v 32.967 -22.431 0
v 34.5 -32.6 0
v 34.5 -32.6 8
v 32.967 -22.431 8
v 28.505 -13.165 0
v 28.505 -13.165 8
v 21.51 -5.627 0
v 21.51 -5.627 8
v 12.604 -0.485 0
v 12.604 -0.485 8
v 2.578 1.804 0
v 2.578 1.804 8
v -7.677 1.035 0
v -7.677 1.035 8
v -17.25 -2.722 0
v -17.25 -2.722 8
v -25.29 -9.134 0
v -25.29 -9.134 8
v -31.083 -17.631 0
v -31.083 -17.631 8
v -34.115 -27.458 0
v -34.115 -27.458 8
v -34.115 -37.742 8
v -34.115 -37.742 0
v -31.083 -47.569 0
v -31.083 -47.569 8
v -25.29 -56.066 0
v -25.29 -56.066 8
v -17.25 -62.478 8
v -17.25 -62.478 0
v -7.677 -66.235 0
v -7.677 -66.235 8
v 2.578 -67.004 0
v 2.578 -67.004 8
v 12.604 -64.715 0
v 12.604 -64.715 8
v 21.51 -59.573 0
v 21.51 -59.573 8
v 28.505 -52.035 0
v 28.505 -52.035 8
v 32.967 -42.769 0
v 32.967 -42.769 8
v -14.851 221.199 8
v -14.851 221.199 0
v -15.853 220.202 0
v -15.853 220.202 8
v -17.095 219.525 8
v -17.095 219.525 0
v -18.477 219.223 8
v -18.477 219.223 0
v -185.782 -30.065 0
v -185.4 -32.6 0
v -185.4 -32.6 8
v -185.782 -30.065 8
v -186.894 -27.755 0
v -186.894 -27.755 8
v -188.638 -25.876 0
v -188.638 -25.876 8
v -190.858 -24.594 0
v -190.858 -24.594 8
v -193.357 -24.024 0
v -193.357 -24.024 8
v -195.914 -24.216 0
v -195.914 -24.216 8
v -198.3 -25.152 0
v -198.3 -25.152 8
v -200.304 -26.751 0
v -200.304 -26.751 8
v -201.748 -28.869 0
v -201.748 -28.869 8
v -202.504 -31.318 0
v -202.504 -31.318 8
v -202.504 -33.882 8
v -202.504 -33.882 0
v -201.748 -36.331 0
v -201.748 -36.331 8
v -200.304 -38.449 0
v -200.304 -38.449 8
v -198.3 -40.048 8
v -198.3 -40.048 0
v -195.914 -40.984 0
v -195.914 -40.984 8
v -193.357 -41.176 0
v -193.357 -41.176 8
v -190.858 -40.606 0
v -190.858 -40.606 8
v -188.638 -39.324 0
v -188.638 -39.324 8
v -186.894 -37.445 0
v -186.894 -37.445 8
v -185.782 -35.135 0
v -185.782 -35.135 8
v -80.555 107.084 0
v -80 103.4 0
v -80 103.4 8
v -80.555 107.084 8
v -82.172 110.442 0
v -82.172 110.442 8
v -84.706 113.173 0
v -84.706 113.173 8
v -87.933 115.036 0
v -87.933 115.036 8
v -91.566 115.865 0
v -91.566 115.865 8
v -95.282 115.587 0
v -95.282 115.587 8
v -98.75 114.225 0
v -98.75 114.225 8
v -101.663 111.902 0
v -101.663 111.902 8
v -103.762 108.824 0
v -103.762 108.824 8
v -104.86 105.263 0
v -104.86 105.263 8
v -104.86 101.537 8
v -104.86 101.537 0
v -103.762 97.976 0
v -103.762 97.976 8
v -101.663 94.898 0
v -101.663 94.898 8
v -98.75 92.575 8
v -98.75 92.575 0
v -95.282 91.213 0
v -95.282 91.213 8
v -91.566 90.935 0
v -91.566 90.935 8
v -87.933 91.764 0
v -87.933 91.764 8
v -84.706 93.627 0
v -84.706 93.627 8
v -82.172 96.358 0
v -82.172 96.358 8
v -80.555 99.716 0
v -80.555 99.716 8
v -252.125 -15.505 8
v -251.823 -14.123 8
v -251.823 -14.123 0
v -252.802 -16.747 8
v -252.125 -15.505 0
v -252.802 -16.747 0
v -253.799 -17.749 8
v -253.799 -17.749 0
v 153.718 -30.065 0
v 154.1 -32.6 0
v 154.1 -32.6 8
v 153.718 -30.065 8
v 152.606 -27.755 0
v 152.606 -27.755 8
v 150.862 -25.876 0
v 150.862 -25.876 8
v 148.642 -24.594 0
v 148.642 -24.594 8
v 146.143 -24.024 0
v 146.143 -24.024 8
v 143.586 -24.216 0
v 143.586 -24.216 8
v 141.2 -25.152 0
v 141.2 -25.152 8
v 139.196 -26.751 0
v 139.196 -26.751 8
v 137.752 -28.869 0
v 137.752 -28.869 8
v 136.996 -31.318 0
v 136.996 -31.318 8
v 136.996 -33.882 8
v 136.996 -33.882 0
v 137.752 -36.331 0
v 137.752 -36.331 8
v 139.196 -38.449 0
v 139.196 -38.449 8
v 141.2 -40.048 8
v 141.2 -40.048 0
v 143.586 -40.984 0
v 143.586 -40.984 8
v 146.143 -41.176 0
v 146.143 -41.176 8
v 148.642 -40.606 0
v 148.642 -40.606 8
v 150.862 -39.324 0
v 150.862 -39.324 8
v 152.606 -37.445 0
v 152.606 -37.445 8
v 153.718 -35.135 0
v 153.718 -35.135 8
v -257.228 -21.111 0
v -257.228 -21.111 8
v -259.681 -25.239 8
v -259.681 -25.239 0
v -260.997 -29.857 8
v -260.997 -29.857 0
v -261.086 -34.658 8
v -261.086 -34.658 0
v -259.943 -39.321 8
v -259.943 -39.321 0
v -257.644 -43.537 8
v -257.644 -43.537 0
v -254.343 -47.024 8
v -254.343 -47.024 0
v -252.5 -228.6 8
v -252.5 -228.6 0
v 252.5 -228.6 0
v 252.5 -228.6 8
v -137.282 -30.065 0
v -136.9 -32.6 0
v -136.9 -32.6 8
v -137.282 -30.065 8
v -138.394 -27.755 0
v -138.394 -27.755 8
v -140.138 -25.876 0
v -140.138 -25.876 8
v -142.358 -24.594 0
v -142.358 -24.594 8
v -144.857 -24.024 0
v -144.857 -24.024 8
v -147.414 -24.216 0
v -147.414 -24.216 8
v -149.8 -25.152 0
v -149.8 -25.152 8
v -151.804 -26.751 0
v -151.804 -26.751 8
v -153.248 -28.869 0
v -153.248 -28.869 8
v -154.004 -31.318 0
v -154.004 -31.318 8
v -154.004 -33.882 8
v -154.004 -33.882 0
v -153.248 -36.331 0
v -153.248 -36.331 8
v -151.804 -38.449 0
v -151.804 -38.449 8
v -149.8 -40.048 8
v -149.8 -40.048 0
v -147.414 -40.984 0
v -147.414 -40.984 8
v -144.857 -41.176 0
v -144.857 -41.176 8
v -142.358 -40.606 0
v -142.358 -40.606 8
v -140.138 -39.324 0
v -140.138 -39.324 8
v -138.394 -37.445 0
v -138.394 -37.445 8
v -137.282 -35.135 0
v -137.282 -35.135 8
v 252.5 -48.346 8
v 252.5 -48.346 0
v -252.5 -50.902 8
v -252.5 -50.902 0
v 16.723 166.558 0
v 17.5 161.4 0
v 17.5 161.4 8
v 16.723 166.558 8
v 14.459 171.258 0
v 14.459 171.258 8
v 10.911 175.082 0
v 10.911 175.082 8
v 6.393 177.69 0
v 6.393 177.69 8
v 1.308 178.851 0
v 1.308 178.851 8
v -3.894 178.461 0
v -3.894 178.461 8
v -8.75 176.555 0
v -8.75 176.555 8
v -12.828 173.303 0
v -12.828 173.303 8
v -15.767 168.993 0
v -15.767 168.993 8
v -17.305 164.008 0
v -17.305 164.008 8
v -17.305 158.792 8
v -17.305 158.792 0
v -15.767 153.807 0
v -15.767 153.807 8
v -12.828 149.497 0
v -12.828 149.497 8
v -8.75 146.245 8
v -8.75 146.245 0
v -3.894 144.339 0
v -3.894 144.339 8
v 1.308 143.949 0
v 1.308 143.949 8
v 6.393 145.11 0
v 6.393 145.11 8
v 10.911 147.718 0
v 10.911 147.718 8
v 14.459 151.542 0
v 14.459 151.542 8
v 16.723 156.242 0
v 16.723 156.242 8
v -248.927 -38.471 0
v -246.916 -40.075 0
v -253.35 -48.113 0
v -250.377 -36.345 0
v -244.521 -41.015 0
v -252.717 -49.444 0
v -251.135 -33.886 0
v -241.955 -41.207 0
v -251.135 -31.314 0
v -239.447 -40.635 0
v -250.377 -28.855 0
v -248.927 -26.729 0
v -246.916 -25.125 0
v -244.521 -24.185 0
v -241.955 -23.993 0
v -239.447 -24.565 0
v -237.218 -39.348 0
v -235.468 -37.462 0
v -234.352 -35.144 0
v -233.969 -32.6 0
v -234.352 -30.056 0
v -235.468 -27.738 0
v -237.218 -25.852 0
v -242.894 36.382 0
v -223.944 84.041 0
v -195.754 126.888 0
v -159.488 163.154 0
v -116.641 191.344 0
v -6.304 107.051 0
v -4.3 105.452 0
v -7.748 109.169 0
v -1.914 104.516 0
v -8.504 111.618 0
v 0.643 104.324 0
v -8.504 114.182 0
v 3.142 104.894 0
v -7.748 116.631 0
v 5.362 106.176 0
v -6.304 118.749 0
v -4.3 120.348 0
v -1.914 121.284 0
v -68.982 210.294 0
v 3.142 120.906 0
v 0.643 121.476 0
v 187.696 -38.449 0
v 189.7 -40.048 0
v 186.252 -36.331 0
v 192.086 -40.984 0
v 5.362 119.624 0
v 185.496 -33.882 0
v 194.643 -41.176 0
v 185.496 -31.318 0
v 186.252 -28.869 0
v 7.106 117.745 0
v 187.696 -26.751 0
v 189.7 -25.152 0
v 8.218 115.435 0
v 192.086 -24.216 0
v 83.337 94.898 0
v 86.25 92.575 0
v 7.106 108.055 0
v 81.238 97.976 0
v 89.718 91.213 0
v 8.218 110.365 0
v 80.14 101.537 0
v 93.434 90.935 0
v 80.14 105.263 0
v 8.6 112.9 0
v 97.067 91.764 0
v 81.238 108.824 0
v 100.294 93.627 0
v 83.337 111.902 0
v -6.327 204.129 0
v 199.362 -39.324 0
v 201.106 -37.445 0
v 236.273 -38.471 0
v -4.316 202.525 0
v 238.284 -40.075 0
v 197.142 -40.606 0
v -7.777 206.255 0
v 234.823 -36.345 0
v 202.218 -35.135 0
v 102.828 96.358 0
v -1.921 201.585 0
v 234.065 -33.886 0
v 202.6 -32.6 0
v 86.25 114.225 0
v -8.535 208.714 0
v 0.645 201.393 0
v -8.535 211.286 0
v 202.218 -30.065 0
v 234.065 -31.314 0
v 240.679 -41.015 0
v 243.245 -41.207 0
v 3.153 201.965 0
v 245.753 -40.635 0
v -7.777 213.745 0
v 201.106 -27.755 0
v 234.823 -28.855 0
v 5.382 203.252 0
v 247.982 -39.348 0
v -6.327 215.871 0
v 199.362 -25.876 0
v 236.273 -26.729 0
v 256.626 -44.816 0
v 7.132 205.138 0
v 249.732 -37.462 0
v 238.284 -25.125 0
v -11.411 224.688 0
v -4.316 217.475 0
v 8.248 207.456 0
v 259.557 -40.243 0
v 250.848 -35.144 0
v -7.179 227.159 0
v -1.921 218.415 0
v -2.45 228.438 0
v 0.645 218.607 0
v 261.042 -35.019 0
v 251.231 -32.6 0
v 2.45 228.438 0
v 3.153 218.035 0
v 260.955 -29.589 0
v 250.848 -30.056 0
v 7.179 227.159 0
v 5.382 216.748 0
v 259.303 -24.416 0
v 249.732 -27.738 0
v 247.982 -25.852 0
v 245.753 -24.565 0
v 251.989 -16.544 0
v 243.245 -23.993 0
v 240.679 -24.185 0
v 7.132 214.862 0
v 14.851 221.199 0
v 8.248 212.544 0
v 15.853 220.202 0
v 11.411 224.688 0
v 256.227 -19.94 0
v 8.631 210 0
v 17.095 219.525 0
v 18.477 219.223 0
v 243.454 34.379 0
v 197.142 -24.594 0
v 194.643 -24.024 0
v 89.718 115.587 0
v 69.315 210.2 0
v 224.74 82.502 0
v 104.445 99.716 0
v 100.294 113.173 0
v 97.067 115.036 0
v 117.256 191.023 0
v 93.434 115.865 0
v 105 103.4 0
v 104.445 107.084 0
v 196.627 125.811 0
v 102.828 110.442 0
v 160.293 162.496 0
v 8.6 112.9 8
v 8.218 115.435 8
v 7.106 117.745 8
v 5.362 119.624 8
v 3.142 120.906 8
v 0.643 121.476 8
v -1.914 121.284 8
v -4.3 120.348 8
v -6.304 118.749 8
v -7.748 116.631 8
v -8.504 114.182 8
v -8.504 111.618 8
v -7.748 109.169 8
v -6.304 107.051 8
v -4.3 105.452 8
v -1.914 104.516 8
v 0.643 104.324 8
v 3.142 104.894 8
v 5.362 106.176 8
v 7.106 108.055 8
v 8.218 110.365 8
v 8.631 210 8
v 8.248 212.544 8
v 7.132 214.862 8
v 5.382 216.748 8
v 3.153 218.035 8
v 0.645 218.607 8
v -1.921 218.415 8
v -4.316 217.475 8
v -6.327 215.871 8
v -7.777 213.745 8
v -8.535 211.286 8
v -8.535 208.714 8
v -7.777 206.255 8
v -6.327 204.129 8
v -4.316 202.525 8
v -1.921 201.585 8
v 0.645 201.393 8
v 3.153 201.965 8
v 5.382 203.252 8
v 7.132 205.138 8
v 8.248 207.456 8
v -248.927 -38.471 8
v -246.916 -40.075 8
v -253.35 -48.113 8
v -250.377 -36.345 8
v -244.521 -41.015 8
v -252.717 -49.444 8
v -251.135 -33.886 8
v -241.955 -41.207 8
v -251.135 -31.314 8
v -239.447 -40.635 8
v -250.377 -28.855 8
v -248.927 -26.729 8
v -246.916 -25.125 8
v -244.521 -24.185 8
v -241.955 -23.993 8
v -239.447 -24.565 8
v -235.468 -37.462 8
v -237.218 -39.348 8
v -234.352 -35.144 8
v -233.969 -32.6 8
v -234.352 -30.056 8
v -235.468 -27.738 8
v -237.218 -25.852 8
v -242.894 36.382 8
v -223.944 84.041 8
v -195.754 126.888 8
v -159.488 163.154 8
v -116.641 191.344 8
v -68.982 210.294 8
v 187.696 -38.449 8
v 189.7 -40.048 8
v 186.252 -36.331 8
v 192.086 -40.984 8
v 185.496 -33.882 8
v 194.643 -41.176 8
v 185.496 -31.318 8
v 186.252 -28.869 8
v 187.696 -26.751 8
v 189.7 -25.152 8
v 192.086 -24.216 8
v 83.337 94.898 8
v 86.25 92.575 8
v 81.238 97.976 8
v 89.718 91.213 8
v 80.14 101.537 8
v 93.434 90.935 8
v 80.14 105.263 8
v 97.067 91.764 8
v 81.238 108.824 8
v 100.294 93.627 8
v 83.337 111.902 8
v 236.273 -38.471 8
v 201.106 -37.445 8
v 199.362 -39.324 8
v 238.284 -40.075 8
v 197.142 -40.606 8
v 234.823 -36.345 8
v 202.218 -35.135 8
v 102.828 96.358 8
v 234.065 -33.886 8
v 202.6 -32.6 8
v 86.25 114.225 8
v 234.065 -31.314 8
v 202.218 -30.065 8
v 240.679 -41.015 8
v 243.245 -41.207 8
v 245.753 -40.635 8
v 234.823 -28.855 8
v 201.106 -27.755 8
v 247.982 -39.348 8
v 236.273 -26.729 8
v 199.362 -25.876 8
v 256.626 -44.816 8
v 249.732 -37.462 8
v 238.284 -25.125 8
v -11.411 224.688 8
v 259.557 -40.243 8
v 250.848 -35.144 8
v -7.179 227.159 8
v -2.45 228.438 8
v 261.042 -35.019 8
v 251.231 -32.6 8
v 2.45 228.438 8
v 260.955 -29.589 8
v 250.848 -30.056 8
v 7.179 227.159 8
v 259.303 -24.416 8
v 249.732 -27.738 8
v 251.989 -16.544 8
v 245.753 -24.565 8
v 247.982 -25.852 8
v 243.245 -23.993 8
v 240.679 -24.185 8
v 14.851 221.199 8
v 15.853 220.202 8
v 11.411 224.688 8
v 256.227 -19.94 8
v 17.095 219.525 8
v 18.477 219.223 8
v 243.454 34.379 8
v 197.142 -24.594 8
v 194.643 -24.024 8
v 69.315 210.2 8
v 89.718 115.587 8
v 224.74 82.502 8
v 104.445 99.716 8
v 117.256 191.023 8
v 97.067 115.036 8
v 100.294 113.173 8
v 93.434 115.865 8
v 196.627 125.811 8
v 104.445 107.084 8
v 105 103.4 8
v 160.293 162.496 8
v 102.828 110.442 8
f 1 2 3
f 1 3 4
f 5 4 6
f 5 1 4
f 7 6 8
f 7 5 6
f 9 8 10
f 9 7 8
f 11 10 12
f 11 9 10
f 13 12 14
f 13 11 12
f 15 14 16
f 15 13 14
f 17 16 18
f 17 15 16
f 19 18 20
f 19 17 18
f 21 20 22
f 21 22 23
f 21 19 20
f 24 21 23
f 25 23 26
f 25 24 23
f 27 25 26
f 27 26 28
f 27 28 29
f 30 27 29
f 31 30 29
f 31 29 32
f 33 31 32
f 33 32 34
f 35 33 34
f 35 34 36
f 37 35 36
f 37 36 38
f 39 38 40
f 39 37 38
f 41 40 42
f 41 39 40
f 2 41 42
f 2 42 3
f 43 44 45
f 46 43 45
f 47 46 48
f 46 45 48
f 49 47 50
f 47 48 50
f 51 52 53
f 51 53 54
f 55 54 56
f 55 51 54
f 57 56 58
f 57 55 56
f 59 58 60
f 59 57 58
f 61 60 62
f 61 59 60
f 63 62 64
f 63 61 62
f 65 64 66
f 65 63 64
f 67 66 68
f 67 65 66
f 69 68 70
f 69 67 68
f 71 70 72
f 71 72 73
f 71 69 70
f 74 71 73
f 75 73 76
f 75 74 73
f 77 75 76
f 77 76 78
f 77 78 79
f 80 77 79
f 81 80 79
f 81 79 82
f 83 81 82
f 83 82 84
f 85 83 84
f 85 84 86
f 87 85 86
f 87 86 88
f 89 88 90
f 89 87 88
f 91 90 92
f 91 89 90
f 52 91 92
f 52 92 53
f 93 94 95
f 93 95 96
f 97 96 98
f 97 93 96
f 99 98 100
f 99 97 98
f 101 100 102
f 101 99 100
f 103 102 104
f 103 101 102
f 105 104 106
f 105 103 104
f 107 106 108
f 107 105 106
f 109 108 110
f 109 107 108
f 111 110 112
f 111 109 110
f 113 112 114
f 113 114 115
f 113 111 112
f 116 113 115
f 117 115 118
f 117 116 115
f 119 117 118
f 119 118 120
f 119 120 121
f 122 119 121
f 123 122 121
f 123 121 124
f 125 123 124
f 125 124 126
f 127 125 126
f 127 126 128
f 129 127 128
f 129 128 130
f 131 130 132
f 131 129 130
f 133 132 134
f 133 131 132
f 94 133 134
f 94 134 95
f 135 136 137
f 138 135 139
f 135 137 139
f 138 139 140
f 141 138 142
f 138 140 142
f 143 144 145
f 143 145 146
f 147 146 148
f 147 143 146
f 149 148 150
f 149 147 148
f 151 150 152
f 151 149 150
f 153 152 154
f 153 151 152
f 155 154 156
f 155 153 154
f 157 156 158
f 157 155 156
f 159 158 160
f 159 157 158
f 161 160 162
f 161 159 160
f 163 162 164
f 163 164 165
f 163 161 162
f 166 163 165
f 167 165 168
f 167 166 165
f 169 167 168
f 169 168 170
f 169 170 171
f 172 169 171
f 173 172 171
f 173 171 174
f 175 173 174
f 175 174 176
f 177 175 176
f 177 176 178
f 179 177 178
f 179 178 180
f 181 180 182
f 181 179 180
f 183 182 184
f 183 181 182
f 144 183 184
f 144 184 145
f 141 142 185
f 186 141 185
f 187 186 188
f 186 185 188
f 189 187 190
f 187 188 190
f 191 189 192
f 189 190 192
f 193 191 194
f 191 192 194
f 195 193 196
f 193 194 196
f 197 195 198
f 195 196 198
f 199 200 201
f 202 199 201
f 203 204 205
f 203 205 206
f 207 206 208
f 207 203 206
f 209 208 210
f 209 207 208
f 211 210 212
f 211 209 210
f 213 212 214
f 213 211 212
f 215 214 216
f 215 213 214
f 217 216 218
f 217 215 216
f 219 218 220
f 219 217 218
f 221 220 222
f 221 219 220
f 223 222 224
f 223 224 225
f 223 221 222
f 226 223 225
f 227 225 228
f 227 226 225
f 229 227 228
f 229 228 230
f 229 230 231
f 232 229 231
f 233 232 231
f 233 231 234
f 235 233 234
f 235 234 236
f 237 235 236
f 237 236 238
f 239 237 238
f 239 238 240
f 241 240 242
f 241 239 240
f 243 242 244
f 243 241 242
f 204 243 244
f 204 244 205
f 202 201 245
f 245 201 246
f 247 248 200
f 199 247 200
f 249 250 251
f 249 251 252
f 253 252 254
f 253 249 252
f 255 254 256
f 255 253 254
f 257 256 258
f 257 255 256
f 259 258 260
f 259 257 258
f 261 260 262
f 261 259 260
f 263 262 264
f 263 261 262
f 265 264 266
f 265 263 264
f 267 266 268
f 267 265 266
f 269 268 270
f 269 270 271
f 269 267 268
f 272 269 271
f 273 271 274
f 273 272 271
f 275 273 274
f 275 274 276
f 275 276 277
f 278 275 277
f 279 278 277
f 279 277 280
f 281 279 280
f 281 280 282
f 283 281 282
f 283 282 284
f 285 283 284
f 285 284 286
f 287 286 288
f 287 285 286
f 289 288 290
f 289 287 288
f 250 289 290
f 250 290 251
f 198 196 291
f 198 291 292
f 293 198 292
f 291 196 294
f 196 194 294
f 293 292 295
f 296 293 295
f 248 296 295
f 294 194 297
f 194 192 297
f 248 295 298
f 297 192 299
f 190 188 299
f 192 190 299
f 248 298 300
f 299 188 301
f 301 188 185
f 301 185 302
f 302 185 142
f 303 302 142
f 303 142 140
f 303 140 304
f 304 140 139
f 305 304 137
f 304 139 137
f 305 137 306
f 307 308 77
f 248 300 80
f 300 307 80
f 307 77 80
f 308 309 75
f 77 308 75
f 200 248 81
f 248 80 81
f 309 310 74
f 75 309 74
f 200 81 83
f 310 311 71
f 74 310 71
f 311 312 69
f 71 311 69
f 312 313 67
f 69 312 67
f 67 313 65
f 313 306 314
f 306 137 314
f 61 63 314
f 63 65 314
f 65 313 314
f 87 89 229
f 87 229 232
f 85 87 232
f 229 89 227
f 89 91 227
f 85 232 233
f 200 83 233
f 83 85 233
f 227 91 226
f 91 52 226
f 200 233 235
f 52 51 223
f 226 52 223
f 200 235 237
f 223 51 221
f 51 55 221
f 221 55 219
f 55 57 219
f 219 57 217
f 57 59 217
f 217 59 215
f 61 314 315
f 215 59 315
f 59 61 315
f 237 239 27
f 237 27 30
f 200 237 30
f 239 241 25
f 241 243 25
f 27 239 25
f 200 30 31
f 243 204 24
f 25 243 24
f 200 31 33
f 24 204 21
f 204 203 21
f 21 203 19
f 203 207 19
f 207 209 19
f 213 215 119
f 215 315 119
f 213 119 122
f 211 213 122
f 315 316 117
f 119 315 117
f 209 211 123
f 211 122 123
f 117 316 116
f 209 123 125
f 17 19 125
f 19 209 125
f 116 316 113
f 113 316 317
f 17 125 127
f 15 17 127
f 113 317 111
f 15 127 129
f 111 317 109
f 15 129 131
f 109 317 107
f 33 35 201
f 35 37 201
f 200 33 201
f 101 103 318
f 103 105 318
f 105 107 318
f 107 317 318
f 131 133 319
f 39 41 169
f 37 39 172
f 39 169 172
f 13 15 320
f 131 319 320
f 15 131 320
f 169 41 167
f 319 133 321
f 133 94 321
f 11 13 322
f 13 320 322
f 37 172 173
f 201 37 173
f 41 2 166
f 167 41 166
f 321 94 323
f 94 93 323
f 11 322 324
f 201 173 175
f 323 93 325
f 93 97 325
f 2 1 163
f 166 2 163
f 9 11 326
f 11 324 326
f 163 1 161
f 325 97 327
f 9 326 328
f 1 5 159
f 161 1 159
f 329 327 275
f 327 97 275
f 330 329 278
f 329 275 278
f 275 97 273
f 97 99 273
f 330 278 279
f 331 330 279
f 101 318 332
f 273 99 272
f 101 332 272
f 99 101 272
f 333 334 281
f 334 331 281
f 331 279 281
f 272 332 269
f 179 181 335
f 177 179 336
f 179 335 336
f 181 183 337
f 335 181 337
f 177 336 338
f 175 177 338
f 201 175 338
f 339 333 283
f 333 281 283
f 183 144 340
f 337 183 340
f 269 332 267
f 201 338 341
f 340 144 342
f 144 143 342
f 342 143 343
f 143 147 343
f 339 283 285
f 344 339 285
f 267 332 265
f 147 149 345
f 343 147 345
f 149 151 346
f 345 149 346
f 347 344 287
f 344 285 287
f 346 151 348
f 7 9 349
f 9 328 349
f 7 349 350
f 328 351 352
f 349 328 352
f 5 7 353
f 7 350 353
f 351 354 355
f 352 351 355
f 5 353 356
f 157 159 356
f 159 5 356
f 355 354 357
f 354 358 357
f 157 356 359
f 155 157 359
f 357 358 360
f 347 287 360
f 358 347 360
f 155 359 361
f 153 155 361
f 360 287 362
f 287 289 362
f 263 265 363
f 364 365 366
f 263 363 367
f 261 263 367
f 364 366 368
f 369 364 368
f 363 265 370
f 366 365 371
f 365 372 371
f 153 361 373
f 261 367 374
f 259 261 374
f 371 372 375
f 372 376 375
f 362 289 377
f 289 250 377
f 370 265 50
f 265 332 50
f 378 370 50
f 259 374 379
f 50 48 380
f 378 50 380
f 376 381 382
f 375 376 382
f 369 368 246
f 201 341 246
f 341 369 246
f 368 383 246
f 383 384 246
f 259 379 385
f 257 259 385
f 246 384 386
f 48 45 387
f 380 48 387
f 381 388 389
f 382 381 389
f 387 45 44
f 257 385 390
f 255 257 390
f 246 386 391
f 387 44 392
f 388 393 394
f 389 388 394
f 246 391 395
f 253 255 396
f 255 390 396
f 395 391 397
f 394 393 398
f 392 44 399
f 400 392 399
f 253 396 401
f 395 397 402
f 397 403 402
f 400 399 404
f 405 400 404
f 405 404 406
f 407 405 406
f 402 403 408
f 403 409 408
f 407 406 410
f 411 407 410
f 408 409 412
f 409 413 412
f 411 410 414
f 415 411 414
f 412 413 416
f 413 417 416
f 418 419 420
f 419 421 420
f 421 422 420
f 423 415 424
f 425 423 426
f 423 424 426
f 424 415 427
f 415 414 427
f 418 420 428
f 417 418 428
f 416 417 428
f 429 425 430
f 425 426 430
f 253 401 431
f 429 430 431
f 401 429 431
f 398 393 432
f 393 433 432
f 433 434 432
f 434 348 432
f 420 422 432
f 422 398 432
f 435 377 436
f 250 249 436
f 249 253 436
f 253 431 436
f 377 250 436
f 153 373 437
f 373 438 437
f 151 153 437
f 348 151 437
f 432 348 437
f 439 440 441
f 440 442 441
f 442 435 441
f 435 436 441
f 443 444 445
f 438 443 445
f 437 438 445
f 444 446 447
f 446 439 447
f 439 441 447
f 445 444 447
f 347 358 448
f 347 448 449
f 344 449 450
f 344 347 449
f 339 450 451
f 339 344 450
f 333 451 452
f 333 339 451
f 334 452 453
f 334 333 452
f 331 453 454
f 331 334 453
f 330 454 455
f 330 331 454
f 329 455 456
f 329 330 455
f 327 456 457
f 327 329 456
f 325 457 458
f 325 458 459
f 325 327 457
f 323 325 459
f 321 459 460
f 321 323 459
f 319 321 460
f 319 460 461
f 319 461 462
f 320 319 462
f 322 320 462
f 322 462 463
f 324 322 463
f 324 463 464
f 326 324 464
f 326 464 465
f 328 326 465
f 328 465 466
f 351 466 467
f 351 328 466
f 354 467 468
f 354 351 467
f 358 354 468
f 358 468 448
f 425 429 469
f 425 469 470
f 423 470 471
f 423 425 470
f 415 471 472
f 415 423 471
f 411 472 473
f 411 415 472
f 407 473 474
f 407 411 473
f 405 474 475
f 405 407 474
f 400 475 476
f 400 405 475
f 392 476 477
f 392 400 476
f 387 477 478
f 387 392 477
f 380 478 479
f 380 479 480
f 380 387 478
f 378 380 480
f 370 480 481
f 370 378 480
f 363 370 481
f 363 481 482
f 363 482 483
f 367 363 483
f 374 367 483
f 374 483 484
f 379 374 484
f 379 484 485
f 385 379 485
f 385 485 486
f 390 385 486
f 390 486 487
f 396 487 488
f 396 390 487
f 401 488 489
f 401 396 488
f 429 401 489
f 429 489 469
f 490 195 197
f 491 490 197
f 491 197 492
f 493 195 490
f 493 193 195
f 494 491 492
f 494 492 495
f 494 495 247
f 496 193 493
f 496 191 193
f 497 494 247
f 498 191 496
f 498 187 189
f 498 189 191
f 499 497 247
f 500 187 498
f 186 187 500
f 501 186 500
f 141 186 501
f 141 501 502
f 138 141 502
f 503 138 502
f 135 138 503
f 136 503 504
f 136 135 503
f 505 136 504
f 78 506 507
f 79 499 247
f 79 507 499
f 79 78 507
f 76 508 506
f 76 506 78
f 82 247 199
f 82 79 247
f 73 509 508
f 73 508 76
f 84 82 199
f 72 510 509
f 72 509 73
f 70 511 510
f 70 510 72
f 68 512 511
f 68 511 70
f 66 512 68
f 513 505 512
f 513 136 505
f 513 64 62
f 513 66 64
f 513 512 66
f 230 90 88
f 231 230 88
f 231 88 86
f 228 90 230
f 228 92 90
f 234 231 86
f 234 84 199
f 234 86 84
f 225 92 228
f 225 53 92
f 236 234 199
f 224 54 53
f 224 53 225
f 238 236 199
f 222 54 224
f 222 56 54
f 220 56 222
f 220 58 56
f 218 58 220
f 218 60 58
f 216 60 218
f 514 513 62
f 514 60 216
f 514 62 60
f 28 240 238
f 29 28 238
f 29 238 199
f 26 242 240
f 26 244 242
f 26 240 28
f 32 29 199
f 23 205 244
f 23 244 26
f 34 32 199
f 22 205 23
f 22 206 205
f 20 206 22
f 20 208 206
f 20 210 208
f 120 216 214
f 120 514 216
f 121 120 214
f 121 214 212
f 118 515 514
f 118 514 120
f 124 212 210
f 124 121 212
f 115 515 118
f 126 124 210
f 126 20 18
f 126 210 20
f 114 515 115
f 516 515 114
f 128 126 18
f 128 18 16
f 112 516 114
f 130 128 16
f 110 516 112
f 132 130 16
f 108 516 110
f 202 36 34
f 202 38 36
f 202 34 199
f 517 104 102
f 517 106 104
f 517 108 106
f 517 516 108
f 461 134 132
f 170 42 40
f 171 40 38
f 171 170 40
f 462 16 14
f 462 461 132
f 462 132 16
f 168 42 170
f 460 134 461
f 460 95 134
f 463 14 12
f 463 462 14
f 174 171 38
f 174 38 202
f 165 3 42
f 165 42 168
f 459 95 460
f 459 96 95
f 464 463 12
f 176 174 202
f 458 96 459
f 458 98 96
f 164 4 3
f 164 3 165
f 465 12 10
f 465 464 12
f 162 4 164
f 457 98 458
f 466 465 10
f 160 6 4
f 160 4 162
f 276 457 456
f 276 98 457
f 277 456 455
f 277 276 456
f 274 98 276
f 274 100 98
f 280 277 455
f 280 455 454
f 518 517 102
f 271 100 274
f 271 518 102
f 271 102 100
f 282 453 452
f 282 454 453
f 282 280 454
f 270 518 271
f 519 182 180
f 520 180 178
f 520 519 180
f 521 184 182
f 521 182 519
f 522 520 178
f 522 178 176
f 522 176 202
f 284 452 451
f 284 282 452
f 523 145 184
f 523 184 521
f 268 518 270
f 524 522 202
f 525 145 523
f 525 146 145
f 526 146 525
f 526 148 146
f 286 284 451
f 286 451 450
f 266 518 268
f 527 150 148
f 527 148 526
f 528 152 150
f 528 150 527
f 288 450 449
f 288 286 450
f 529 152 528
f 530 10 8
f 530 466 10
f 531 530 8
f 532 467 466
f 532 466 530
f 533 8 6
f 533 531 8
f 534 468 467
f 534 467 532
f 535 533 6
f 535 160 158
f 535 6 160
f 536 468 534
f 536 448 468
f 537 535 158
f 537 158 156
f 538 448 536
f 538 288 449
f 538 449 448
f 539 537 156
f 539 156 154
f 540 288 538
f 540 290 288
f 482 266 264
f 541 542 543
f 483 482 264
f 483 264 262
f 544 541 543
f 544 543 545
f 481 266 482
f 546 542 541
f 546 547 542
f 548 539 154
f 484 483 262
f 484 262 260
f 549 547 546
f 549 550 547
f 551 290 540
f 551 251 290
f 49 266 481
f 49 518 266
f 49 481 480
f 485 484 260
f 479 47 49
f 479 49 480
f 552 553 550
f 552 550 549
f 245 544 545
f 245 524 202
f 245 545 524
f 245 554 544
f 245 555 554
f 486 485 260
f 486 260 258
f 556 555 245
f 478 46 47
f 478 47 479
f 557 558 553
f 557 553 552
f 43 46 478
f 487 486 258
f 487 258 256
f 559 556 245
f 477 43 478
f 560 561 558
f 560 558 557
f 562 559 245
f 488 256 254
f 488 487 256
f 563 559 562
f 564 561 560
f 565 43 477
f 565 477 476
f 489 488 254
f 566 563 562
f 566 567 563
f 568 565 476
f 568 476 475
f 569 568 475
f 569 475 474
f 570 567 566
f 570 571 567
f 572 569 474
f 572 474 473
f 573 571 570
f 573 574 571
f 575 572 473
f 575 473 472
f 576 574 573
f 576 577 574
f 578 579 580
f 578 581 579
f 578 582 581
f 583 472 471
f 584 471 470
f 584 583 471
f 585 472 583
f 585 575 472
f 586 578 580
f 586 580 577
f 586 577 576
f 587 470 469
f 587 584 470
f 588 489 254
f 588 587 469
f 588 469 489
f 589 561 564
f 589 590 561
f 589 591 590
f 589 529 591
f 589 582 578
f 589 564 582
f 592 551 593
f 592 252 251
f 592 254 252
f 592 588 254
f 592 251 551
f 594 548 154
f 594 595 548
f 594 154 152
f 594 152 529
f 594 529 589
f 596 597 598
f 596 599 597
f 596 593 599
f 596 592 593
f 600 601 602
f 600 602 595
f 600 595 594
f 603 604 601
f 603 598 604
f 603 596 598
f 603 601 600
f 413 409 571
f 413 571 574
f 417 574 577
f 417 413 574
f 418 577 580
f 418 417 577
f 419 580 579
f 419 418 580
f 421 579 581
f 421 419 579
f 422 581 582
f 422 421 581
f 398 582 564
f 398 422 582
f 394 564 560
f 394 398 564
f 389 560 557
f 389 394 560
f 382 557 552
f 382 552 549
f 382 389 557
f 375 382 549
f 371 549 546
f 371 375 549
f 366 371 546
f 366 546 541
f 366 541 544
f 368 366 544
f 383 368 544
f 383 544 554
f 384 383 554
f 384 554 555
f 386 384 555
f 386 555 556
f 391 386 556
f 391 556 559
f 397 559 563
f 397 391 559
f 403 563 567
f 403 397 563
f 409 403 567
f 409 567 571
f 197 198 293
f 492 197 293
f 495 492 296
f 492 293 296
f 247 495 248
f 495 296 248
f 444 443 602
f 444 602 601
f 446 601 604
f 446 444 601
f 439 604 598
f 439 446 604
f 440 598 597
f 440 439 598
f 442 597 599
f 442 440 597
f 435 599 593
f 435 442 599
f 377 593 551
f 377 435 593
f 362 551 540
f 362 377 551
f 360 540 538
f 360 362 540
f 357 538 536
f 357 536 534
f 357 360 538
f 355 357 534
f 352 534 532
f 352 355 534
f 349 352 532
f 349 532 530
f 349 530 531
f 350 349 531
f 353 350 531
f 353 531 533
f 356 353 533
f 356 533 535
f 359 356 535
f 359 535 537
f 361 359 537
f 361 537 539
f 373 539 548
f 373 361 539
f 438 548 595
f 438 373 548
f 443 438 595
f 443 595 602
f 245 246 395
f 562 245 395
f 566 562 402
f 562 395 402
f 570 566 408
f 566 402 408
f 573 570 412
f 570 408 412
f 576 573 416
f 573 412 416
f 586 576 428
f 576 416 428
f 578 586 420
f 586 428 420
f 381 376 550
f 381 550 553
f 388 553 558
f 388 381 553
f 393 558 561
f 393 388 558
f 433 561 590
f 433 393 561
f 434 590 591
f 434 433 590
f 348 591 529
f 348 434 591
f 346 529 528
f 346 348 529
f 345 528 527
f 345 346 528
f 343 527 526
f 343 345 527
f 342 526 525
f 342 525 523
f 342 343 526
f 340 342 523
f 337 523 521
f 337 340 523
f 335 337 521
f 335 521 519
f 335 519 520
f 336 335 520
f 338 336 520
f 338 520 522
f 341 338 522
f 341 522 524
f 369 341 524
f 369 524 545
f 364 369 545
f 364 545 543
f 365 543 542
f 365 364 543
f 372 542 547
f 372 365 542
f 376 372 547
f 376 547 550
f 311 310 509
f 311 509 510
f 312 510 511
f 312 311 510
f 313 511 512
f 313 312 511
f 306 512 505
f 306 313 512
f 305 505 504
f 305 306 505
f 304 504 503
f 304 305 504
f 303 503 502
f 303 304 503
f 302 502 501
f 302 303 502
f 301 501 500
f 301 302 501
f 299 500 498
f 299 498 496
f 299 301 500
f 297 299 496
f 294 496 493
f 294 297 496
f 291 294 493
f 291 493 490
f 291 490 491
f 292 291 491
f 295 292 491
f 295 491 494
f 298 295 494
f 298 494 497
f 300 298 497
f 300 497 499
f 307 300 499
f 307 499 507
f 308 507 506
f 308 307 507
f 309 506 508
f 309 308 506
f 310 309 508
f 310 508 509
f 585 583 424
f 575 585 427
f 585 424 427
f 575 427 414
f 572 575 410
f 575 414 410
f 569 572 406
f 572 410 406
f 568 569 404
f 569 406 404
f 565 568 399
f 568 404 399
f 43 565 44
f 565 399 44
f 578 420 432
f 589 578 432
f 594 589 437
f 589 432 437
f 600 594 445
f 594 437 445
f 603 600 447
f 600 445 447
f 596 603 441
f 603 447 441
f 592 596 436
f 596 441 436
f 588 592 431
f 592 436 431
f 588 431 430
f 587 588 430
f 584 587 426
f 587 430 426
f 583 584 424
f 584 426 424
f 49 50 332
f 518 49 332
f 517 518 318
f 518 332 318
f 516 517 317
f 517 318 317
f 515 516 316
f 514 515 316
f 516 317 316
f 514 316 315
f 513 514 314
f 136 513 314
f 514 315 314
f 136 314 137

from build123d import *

# Parameters (mm, degrees)
F0_R     = 8.631475
F0_R_2   = 8.6
F0_R_3   = 34.5
F0_R_4   = 12.5
F0_R_5   = 17.5
F1_DEPTH = 8


# Not quite as in the source:
# - ends of sketch curves that miss each other by under 0.0002 mm in the source are joined


with BuildPart() as f1:
    # F0 (on Top) → F1 (new body)
    with BuildSketch(Plane.XY):
        with BuildLine():
            ThreePointArc((18.476772036, 219.2230704901), (16.4501234267, 219.819241628), (14.8505619493, 221.1991429618))
            ThreePointArc((14.8505619493, 221.1991429618), (3.011e-07, 228.6), (-14.8505617308, 221.1991435511))
            ThreePointArc((-14.8505617308, 221.1991435511), (-16.4501227245, 219.8192420107), (-18.4767710413, 219.2230705631))
            ThreePointArc((-18.4767710413, 219.2230705631), (-178.5444622496, 145.9444622496), (-251.8230706896, -14.1232289494))
            ThreePointArc((-251.8230706896, -14.1232289494), (-252.4192420107, -16.1498772755), (-253.7991434425, -17.7494384132))
            ThreePointArc((-253.7991434425, -17.7494384132), (-261.1967885287, -32.2543753223), (-254.343219804, -47.0241737592))
            ThreePointArc((-254.343219804, -47.0241737592), (-252.9842553662, -48.7550030017), (-252.5, -50.90164))
            Line((-252.5, -50.90164), (-252.5, -228.6))
            Line((-252.5, -228.6), (252.5, -228.6))
            Line((252.5, -228.6), (252.5, -48.346429))
            ThreePointArc((252.5, -48.346429), (261.1975992169, -32.3011633084), (251.9889742877, -16.5436255081))
            ThreePointArc((251.9889742877, -16.5436255081), (179.4001497018, 145.0846540559), (18.476772036, 219.2230704901))
        make_face()
        with Locations((-242.6, -32.6)):
            Circle(F0_R, mode=Mode.SUBTRACT)
        with Locations((-194, -32.6)):
            Circle(F0_R_2, mode=Mode.SUBTRACT)
        with Locations((-145.5, -32.6)):
            Circle(F0_R_2, mode=Mode.SUBTRACT)
        with Locations((0, -32.6)):
            Circle(F0_R_3, mode=Mode.SUBTRACT)
        with Locations((145.5, -32.6)):
            Circle(F0_R_2, mode=Mode.SUBTRACT)
        with Locations((194, -32.6)):
            Circle(F0_R_2, mode=Mode.SUBTRACT)
        with Locations((242.6, -32.6)):
            Circle(F0_R, mode=Mode.SUBTRACT)
        with Locations((-92.5, 103.4)):
            Circle(F0_R_4, mode=Mode.SUBTRACT)
        with Locations((0, 112.9)):
            Circle(F0_R_2, mode=Mode.SUBTRACT)
        with Locations((92.5, 103.4)):
            Circle(F0_R_4, mode=Mode.SUBTRACT)
        with Locations((0, 161.4)):
            Circle(F0_R_5, mode=Mode.SUBTRACT)
        with Locations((0, 210)):
            Circle(F0_R, mode=Mode.SUBTRACT)
    extrude(amount=F1_DEPTH)


solid = f1.part
